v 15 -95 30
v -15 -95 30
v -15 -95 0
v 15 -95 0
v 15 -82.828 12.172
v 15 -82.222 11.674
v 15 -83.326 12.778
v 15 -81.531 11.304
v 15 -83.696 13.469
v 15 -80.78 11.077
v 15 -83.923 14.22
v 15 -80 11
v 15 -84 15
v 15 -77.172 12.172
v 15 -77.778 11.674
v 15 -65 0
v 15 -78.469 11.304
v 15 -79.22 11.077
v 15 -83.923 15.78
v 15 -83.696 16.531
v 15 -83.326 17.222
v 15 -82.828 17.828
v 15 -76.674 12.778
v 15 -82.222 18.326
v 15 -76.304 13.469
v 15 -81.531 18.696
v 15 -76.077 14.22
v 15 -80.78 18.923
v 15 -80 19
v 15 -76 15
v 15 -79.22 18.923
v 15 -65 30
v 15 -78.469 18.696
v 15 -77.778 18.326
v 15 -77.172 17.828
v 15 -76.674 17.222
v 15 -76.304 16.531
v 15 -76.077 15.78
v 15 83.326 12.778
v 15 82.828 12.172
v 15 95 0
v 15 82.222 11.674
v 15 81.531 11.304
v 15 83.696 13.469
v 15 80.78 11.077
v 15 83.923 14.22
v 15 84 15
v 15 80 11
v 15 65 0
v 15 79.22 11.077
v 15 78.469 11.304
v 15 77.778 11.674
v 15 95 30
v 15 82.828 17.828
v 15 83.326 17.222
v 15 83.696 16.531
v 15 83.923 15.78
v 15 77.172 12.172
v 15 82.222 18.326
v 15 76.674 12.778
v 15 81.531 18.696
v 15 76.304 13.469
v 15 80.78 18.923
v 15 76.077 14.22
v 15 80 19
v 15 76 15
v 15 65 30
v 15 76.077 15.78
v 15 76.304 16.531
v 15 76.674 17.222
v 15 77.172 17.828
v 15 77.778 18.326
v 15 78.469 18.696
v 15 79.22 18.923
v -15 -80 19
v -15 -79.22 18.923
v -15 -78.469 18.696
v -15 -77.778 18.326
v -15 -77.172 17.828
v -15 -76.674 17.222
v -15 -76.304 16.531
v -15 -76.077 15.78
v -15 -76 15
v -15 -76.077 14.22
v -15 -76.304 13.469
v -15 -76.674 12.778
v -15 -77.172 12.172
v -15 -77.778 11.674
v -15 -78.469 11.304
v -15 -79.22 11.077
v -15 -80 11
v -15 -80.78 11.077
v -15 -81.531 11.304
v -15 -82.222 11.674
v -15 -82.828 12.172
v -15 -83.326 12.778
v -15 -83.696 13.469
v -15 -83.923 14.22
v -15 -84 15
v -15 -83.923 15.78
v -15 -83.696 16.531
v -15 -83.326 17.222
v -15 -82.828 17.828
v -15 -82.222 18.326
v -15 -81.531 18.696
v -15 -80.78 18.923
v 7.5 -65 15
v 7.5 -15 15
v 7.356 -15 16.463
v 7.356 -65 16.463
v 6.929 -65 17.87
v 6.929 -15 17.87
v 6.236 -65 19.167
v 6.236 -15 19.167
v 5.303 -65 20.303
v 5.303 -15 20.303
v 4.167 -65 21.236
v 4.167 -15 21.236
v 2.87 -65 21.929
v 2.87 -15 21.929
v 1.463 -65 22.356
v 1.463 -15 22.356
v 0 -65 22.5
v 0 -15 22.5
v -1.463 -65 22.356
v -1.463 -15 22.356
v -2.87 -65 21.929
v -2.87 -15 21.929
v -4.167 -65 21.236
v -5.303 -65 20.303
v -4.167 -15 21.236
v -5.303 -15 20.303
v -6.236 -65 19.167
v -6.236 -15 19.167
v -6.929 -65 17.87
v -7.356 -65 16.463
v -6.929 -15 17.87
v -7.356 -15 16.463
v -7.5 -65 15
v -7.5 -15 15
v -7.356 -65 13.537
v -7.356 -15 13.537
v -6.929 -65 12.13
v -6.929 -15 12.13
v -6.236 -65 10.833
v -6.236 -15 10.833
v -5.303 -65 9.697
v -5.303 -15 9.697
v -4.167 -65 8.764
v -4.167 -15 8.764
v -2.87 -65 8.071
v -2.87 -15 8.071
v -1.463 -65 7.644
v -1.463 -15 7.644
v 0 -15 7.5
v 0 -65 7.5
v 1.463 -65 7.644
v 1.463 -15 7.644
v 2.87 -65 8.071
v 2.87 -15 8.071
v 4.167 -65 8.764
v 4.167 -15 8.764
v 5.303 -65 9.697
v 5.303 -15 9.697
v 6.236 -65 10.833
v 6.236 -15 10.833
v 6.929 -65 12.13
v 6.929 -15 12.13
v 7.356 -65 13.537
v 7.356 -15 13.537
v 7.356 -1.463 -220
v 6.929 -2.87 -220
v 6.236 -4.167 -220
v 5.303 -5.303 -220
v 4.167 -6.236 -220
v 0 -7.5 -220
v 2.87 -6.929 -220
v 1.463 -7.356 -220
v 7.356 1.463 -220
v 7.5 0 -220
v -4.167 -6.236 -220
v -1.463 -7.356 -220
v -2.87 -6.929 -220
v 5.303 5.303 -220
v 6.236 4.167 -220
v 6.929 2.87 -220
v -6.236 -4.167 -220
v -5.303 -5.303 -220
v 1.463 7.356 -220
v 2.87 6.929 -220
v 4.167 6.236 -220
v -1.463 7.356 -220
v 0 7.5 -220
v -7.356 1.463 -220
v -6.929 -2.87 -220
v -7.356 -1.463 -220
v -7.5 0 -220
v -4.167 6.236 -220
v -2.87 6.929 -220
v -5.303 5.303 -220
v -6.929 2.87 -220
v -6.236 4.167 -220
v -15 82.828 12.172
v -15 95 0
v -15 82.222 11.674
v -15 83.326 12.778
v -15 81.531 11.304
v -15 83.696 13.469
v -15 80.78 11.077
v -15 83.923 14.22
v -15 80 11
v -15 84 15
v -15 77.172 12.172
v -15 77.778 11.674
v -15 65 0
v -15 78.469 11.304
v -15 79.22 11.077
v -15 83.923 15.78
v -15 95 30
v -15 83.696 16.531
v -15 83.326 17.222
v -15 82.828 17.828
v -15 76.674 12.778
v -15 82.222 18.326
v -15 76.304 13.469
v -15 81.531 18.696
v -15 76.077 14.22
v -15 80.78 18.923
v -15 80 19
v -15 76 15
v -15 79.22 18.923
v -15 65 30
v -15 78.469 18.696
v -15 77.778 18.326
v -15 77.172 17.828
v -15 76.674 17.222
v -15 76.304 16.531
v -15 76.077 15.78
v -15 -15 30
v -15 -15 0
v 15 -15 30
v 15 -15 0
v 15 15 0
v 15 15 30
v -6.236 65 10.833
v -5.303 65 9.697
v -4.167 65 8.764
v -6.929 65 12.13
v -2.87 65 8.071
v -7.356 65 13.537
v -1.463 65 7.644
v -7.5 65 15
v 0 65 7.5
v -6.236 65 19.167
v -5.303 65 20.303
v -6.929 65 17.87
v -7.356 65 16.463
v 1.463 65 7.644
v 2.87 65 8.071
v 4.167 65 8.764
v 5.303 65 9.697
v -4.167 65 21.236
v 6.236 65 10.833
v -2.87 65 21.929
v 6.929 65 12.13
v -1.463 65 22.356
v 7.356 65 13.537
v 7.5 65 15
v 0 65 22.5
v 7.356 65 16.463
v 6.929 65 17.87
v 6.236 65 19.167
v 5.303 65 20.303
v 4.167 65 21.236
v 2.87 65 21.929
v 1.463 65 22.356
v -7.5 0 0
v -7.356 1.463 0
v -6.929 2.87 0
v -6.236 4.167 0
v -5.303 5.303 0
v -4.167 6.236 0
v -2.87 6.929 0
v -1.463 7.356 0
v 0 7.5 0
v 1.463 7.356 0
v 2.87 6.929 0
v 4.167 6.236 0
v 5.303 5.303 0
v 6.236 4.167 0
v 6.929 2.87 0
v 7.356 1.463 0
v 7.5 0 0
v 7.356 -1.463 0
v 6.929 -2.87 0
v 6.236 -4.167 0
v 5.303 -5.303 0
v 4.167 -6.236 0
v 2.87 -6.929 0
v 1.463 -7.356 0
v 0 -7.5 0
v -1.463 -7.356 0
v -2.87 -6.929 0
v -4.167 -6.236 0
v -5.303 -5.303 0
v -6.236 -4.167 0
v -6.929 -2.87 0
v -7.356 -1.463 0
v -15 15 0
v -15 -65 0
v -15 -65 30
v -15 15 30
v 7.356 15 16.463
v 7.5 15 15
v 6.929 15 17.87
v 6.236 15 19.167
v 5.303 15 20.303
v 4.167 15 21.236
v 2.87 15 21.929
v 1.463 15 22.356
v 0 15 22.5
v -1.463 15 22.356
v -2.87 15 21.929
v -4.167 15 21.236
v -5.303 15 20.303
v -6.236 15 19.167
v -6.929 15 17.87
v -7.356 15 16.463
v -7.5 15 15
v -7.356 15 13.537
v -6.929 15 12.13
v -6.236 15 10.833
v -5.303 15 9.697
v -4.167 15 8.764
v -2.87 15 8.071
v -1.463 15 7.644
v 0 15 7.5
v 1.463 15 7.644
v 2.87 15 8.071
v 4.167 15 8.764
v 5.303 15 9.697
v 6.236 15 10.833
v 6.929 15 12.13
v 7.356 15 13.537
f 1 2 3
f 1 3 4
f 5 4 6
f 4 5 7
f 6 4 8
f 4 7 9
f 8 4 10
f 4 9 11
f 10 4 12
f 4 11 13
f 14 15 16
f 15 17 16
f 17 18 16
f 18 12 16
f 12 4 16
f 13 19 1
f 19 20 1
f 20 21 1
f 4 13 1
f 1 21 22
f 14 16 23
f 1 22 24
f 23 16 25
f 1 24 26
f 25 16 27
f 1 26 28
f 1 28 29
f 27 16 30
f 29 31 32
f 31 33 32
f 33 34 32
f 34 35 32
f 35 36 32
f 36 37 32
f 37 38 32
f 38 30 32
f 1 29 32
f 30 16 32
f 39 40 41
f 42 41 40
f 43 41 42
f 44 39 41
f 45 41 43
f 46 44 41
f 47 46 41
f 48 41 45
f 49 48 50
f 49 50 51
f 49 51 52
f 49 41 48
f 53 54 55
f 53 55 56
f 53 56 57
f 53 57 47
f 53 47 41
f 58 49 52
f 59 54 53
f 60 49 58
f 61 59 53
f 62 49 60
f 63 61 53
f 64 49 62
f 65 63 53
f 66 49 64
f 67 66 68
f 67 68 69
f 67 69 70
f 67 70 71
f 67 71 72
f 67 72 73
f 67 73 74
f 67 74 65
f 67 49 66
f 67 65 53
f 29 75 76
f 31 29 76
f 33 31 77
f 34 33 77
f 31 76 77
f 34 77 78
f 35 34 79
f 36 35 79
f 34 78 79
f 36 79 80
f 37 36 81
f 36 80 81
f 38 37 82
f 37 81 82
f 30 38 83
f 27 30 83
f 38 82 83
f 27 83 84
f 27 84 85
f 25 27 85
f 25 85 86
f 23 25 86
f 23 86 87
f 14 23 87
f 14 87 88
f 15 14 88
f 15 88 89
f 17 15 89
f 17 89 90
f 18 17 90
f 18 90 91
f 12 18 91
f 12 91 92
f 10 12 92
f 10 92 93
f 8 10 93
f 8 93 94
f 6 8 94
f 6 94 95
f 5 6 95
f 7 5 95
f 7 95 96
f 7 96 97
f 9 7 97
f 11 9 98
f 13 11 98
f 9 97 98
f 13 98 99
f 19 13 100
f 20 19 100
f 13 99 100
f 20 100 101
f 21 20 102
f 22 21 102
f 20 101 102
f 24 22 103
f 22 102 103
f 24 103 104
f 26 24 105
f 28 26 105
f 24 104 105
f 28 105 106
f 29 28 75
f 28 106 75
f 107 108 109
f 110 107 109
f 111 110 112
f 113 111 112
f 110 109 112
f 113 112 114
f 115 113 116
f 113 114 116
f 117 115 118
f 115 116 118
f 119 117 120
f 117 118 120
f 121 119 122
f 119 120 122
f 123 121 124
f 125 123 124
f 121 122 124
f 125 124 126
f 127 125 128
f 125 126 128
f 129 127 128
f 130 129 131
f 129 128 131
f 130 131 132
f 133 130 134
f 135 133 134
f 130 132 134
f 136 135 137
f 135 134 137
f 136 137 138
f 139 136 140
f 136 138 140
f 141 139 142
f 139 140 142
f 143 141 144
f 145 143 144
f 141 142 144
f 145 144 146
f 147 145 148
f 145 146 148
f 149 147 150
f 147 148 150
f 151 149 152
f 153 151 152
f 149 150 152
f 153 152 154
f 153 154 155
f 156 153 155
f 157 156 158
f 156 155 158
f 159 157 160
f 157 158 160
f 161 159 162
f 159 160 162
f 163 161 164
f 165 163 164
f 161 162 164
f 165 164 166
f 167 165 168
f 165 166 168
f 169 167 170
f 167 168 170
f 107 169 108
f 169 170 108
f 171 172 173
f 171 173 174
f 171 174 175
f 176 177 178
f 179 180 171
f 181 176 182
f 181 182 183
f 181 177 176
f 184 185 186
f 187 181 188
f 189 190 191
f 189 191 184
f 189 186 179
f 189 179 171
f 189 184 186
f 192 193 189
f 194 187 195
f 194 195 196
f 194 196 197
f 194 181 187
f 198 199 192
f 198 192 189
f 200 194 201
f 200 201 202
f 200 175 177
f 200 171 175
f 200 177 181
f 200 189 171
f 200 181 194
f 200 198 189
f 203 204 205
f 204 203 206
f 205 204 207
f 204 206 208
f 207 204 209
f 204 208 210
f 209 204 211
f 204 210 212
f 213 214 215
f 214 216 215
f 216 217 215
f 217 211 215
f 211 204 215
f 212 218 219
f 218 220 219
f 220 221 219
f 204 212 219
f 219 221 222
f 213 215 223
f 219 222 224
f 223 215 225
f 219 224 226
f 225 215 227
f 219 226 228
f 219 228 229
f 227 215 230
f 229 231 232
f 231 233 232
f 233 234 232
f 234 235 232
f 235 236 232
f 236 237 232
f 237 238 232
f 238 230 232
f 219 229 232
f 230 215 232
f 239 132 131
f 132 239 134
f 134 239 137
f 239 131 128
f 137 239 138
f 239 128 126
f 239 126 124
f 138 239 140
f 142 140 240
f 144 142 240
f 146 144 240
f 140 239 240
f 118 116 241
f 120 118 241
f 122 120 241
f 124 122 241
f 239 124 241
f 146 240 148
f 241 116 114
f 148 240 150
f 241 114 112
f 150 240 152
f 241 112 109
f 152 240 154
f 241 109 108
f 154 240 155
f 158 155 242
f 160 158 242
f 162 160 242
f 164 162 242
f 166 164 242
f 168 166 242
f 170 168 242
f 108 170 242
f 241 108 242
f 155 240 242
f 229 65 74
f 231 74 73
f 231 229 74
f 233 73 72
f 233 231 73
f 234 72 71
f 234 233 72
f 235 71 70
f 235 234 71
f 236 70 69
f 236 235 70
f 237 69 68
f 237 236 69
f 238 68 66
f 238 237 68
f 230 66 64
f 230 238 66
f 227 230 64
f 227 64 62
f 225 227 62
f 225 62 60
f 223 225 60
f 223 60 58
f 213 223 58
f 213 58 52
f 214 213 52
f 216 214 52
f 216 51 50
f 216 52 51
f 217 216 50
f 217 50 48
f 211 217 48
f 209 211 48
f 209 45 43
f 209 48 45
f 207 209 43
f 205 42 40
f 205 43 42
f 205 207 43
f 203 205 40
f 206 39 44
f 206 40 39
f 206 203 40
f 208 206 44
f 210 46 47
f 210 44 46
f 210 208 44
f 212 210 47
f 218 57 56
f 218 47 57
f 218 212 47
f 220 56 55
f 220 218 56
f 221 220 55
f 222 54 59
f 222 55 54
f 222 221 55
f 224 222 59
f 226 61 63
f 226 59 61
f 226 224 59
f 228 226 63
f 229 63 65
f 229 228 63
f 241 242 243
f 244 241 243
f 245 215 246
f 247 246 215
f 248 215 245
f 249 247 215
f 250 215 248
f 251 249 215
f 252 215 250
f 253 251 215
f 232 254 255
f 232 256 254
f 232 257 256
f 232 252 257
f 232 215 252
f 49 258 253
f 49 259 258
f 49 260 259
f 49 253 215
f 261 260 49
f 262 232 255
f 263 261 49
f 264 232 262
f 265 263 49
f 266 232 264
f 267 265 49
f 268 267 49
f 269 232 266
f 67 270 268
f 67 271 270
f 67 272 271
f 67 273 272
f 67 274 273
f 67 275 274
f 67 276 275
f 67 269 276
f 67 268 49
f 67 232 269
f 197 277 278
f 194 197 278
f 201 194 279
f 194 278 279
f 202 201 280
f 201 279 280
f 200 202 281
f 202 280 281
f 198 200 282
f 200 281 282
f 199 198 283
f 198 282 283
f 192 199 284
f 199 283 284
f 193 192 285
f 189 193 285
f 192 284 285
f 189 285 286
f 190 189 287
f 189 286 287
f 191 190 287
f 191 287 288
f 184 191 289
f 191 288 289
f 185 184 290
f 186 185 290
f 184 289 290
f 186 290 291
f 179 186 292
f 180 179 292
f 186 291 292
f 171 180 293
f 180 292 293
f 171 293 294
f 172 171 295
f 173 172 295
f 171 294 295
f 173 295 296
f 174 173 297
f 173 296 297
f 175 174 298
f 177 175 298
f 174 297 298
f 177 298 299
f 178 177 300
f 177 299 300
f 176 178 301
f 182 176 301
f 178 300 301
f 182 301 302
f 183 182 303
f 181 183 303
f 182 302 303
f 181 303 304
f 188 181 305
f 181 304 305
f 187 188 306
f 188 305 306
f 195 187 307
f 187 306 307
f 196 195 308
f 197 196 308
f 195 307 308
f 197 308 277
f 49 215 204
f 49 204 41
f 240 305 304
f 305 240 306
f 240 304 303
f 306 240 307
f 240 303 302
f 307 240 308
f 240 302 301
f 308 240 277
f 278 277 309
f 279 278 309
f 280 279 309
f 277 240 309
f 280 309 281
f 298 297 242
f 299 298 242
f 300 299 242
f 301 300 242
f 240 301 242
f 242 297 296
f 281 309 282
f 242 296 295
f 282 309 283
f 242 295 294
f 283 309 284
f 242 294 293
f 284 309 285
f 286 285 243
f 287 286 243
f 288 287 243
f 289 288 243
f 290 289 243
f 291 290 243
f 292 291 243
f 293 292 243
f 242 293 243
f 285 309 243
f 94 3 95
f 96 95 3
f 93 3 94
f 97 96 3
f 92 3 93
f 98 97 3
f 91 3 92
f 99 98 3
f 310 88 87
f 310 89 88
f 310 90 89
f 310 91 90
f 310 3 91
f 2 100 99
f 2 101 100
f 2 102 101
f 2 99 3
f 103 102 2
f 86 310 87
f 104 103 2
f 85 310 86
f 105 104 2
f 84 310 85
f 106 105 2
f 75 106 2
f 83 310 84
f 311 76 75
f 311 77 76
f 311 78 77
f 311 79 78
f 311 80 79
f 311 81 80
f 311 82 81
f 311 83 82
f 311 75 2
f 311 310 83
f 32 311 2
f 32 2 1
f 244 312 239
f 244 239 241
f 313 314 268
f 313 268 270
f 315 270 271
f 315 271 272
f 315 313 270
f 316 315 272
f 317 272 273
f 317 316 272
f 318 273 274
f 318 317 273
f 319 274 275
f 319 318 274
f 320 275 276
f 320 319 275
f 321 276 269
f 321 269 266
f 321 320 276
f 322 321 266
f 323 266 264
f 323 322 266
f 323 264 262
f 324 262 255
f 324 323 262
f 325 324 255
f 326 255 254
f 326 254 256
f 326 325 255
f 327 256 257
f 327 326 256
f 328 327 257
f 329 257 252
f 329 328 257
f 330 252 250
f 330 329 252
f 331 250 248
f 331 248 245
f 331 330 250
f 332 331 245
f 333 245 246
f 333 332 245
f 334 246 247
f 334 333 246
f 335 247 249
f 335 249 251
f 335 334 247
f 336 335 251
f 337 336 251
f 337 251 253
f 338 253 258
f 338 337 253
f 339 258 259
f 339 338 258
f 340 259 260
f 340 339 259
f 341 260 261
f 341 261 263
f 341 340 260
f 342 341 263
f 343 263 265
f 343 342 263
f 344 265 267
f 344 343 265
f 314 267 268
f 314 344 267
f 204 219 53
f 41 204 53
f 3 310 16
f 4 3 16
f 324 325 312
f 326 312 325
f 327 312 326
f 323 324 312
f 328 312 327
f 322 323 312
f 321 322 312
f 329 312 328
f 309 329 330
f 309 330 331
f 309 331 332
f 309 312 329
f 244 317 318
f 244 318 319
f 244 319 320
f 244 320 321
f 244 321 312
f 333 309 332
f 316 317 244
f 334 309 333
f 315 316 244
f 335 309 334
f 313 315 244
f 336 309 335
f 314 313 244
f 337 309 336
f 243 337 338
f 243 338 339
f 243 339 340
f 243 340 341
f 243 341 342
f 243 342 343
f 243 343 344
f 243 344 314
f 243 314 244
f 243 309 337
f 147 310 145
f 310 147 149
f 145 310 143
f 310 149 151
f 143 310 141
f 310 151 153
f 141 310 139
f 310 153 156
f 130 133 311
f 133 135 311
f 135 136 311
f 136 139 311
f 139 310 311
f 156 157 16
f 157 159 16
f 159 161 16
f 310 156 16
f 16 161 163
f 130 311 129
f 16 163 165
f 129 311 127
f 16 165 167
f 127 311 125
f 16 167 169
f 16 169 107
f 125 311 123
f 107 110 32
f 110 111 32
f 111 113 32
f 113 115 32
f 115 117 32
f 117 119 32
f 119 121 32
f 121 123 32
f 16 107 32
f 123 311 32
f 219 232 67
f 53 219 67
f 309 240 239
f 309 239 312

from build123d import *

# Parameters (mm, degrees)
SKETCH_1_W          = 30
SKETCH_1_H          = 30
EXTRUDE_1_DEPTH     = 30
SKETCH_2_R          = 7.5
EXTRUDE_2_DEPTH     = 220
SKETCH_3_R          = 7.5
EXTRUDE_3_DEPTH     = 50
SKETCH_4_W          = 30
SKETCH_4_H          = 30
EXTRUDE_4_DEPTH     = 30
SKETCH_5_R          = 4
CUT_EXTRUDE_1_DEPTH = 31


with BuildPart() as part:
    # 草图1 → 凸台-拉伸1 (new body)
    with BuildSketch(Plane.XY):
        Rectangle(SKETCH_1_W, SKETCH_1_H)
    extrude(amount=EXTRUDE_1_DEPTH)

    # 草图2 → 凸台-拉伸2 (add)
    with BuildSketch(Plane(origin=(0, 0, 0), x_dir=(-1, 0, 0), z_dir=(0, 0, -1))):
        Circle(SKETCH_2_R)
    extrude(amount=EXTRUDE_2_DEPTH)

    # 草图3 → 凸台-拉伸3 (add)
    with BuildSketch(Plane.XZ.offset(15)):
        with Locations((0, 15)):
            Circle(SKETCH_3_R)
    extrude_3 = extrude(amount=EXTRUDE_3_DEPTH)

    # 草图4 → 凸台-拉伸4 (add)
    with BuildSketch(Plane.XZ.offset(65)):
        with Locations((0, 15)):
            Rectangle(SKETCH_4_W, SKETCH_4_H)
    extrude_4 = extrude(amount=EXTRUDE_4_DEPTH)

    # 草图5 → 切除-拉伸1 (cut, through all)
    with BuildSketch(Plane.ZY.offset(15)):
        with Locations((15, -80)):
            Circle(SKETCH_5_R)
    cut_extrude_1 = extrude(amount=-CUT_EXTRUDE_1_DEPTH, mode=Mode.SUBTRACT)

    # 镜向1: 凸台-拉伸3, 凸台-拉伸4, 切除-拉伸1 across plane
    add(extrude_3.mirror(Plane.ZX))
    add(extrude_4.mirror(Plane.ZX))
    add(cut_extrude_1.mirror(Plane.ZX), mode=Mode.SUBTRACT)


solid = part.part
